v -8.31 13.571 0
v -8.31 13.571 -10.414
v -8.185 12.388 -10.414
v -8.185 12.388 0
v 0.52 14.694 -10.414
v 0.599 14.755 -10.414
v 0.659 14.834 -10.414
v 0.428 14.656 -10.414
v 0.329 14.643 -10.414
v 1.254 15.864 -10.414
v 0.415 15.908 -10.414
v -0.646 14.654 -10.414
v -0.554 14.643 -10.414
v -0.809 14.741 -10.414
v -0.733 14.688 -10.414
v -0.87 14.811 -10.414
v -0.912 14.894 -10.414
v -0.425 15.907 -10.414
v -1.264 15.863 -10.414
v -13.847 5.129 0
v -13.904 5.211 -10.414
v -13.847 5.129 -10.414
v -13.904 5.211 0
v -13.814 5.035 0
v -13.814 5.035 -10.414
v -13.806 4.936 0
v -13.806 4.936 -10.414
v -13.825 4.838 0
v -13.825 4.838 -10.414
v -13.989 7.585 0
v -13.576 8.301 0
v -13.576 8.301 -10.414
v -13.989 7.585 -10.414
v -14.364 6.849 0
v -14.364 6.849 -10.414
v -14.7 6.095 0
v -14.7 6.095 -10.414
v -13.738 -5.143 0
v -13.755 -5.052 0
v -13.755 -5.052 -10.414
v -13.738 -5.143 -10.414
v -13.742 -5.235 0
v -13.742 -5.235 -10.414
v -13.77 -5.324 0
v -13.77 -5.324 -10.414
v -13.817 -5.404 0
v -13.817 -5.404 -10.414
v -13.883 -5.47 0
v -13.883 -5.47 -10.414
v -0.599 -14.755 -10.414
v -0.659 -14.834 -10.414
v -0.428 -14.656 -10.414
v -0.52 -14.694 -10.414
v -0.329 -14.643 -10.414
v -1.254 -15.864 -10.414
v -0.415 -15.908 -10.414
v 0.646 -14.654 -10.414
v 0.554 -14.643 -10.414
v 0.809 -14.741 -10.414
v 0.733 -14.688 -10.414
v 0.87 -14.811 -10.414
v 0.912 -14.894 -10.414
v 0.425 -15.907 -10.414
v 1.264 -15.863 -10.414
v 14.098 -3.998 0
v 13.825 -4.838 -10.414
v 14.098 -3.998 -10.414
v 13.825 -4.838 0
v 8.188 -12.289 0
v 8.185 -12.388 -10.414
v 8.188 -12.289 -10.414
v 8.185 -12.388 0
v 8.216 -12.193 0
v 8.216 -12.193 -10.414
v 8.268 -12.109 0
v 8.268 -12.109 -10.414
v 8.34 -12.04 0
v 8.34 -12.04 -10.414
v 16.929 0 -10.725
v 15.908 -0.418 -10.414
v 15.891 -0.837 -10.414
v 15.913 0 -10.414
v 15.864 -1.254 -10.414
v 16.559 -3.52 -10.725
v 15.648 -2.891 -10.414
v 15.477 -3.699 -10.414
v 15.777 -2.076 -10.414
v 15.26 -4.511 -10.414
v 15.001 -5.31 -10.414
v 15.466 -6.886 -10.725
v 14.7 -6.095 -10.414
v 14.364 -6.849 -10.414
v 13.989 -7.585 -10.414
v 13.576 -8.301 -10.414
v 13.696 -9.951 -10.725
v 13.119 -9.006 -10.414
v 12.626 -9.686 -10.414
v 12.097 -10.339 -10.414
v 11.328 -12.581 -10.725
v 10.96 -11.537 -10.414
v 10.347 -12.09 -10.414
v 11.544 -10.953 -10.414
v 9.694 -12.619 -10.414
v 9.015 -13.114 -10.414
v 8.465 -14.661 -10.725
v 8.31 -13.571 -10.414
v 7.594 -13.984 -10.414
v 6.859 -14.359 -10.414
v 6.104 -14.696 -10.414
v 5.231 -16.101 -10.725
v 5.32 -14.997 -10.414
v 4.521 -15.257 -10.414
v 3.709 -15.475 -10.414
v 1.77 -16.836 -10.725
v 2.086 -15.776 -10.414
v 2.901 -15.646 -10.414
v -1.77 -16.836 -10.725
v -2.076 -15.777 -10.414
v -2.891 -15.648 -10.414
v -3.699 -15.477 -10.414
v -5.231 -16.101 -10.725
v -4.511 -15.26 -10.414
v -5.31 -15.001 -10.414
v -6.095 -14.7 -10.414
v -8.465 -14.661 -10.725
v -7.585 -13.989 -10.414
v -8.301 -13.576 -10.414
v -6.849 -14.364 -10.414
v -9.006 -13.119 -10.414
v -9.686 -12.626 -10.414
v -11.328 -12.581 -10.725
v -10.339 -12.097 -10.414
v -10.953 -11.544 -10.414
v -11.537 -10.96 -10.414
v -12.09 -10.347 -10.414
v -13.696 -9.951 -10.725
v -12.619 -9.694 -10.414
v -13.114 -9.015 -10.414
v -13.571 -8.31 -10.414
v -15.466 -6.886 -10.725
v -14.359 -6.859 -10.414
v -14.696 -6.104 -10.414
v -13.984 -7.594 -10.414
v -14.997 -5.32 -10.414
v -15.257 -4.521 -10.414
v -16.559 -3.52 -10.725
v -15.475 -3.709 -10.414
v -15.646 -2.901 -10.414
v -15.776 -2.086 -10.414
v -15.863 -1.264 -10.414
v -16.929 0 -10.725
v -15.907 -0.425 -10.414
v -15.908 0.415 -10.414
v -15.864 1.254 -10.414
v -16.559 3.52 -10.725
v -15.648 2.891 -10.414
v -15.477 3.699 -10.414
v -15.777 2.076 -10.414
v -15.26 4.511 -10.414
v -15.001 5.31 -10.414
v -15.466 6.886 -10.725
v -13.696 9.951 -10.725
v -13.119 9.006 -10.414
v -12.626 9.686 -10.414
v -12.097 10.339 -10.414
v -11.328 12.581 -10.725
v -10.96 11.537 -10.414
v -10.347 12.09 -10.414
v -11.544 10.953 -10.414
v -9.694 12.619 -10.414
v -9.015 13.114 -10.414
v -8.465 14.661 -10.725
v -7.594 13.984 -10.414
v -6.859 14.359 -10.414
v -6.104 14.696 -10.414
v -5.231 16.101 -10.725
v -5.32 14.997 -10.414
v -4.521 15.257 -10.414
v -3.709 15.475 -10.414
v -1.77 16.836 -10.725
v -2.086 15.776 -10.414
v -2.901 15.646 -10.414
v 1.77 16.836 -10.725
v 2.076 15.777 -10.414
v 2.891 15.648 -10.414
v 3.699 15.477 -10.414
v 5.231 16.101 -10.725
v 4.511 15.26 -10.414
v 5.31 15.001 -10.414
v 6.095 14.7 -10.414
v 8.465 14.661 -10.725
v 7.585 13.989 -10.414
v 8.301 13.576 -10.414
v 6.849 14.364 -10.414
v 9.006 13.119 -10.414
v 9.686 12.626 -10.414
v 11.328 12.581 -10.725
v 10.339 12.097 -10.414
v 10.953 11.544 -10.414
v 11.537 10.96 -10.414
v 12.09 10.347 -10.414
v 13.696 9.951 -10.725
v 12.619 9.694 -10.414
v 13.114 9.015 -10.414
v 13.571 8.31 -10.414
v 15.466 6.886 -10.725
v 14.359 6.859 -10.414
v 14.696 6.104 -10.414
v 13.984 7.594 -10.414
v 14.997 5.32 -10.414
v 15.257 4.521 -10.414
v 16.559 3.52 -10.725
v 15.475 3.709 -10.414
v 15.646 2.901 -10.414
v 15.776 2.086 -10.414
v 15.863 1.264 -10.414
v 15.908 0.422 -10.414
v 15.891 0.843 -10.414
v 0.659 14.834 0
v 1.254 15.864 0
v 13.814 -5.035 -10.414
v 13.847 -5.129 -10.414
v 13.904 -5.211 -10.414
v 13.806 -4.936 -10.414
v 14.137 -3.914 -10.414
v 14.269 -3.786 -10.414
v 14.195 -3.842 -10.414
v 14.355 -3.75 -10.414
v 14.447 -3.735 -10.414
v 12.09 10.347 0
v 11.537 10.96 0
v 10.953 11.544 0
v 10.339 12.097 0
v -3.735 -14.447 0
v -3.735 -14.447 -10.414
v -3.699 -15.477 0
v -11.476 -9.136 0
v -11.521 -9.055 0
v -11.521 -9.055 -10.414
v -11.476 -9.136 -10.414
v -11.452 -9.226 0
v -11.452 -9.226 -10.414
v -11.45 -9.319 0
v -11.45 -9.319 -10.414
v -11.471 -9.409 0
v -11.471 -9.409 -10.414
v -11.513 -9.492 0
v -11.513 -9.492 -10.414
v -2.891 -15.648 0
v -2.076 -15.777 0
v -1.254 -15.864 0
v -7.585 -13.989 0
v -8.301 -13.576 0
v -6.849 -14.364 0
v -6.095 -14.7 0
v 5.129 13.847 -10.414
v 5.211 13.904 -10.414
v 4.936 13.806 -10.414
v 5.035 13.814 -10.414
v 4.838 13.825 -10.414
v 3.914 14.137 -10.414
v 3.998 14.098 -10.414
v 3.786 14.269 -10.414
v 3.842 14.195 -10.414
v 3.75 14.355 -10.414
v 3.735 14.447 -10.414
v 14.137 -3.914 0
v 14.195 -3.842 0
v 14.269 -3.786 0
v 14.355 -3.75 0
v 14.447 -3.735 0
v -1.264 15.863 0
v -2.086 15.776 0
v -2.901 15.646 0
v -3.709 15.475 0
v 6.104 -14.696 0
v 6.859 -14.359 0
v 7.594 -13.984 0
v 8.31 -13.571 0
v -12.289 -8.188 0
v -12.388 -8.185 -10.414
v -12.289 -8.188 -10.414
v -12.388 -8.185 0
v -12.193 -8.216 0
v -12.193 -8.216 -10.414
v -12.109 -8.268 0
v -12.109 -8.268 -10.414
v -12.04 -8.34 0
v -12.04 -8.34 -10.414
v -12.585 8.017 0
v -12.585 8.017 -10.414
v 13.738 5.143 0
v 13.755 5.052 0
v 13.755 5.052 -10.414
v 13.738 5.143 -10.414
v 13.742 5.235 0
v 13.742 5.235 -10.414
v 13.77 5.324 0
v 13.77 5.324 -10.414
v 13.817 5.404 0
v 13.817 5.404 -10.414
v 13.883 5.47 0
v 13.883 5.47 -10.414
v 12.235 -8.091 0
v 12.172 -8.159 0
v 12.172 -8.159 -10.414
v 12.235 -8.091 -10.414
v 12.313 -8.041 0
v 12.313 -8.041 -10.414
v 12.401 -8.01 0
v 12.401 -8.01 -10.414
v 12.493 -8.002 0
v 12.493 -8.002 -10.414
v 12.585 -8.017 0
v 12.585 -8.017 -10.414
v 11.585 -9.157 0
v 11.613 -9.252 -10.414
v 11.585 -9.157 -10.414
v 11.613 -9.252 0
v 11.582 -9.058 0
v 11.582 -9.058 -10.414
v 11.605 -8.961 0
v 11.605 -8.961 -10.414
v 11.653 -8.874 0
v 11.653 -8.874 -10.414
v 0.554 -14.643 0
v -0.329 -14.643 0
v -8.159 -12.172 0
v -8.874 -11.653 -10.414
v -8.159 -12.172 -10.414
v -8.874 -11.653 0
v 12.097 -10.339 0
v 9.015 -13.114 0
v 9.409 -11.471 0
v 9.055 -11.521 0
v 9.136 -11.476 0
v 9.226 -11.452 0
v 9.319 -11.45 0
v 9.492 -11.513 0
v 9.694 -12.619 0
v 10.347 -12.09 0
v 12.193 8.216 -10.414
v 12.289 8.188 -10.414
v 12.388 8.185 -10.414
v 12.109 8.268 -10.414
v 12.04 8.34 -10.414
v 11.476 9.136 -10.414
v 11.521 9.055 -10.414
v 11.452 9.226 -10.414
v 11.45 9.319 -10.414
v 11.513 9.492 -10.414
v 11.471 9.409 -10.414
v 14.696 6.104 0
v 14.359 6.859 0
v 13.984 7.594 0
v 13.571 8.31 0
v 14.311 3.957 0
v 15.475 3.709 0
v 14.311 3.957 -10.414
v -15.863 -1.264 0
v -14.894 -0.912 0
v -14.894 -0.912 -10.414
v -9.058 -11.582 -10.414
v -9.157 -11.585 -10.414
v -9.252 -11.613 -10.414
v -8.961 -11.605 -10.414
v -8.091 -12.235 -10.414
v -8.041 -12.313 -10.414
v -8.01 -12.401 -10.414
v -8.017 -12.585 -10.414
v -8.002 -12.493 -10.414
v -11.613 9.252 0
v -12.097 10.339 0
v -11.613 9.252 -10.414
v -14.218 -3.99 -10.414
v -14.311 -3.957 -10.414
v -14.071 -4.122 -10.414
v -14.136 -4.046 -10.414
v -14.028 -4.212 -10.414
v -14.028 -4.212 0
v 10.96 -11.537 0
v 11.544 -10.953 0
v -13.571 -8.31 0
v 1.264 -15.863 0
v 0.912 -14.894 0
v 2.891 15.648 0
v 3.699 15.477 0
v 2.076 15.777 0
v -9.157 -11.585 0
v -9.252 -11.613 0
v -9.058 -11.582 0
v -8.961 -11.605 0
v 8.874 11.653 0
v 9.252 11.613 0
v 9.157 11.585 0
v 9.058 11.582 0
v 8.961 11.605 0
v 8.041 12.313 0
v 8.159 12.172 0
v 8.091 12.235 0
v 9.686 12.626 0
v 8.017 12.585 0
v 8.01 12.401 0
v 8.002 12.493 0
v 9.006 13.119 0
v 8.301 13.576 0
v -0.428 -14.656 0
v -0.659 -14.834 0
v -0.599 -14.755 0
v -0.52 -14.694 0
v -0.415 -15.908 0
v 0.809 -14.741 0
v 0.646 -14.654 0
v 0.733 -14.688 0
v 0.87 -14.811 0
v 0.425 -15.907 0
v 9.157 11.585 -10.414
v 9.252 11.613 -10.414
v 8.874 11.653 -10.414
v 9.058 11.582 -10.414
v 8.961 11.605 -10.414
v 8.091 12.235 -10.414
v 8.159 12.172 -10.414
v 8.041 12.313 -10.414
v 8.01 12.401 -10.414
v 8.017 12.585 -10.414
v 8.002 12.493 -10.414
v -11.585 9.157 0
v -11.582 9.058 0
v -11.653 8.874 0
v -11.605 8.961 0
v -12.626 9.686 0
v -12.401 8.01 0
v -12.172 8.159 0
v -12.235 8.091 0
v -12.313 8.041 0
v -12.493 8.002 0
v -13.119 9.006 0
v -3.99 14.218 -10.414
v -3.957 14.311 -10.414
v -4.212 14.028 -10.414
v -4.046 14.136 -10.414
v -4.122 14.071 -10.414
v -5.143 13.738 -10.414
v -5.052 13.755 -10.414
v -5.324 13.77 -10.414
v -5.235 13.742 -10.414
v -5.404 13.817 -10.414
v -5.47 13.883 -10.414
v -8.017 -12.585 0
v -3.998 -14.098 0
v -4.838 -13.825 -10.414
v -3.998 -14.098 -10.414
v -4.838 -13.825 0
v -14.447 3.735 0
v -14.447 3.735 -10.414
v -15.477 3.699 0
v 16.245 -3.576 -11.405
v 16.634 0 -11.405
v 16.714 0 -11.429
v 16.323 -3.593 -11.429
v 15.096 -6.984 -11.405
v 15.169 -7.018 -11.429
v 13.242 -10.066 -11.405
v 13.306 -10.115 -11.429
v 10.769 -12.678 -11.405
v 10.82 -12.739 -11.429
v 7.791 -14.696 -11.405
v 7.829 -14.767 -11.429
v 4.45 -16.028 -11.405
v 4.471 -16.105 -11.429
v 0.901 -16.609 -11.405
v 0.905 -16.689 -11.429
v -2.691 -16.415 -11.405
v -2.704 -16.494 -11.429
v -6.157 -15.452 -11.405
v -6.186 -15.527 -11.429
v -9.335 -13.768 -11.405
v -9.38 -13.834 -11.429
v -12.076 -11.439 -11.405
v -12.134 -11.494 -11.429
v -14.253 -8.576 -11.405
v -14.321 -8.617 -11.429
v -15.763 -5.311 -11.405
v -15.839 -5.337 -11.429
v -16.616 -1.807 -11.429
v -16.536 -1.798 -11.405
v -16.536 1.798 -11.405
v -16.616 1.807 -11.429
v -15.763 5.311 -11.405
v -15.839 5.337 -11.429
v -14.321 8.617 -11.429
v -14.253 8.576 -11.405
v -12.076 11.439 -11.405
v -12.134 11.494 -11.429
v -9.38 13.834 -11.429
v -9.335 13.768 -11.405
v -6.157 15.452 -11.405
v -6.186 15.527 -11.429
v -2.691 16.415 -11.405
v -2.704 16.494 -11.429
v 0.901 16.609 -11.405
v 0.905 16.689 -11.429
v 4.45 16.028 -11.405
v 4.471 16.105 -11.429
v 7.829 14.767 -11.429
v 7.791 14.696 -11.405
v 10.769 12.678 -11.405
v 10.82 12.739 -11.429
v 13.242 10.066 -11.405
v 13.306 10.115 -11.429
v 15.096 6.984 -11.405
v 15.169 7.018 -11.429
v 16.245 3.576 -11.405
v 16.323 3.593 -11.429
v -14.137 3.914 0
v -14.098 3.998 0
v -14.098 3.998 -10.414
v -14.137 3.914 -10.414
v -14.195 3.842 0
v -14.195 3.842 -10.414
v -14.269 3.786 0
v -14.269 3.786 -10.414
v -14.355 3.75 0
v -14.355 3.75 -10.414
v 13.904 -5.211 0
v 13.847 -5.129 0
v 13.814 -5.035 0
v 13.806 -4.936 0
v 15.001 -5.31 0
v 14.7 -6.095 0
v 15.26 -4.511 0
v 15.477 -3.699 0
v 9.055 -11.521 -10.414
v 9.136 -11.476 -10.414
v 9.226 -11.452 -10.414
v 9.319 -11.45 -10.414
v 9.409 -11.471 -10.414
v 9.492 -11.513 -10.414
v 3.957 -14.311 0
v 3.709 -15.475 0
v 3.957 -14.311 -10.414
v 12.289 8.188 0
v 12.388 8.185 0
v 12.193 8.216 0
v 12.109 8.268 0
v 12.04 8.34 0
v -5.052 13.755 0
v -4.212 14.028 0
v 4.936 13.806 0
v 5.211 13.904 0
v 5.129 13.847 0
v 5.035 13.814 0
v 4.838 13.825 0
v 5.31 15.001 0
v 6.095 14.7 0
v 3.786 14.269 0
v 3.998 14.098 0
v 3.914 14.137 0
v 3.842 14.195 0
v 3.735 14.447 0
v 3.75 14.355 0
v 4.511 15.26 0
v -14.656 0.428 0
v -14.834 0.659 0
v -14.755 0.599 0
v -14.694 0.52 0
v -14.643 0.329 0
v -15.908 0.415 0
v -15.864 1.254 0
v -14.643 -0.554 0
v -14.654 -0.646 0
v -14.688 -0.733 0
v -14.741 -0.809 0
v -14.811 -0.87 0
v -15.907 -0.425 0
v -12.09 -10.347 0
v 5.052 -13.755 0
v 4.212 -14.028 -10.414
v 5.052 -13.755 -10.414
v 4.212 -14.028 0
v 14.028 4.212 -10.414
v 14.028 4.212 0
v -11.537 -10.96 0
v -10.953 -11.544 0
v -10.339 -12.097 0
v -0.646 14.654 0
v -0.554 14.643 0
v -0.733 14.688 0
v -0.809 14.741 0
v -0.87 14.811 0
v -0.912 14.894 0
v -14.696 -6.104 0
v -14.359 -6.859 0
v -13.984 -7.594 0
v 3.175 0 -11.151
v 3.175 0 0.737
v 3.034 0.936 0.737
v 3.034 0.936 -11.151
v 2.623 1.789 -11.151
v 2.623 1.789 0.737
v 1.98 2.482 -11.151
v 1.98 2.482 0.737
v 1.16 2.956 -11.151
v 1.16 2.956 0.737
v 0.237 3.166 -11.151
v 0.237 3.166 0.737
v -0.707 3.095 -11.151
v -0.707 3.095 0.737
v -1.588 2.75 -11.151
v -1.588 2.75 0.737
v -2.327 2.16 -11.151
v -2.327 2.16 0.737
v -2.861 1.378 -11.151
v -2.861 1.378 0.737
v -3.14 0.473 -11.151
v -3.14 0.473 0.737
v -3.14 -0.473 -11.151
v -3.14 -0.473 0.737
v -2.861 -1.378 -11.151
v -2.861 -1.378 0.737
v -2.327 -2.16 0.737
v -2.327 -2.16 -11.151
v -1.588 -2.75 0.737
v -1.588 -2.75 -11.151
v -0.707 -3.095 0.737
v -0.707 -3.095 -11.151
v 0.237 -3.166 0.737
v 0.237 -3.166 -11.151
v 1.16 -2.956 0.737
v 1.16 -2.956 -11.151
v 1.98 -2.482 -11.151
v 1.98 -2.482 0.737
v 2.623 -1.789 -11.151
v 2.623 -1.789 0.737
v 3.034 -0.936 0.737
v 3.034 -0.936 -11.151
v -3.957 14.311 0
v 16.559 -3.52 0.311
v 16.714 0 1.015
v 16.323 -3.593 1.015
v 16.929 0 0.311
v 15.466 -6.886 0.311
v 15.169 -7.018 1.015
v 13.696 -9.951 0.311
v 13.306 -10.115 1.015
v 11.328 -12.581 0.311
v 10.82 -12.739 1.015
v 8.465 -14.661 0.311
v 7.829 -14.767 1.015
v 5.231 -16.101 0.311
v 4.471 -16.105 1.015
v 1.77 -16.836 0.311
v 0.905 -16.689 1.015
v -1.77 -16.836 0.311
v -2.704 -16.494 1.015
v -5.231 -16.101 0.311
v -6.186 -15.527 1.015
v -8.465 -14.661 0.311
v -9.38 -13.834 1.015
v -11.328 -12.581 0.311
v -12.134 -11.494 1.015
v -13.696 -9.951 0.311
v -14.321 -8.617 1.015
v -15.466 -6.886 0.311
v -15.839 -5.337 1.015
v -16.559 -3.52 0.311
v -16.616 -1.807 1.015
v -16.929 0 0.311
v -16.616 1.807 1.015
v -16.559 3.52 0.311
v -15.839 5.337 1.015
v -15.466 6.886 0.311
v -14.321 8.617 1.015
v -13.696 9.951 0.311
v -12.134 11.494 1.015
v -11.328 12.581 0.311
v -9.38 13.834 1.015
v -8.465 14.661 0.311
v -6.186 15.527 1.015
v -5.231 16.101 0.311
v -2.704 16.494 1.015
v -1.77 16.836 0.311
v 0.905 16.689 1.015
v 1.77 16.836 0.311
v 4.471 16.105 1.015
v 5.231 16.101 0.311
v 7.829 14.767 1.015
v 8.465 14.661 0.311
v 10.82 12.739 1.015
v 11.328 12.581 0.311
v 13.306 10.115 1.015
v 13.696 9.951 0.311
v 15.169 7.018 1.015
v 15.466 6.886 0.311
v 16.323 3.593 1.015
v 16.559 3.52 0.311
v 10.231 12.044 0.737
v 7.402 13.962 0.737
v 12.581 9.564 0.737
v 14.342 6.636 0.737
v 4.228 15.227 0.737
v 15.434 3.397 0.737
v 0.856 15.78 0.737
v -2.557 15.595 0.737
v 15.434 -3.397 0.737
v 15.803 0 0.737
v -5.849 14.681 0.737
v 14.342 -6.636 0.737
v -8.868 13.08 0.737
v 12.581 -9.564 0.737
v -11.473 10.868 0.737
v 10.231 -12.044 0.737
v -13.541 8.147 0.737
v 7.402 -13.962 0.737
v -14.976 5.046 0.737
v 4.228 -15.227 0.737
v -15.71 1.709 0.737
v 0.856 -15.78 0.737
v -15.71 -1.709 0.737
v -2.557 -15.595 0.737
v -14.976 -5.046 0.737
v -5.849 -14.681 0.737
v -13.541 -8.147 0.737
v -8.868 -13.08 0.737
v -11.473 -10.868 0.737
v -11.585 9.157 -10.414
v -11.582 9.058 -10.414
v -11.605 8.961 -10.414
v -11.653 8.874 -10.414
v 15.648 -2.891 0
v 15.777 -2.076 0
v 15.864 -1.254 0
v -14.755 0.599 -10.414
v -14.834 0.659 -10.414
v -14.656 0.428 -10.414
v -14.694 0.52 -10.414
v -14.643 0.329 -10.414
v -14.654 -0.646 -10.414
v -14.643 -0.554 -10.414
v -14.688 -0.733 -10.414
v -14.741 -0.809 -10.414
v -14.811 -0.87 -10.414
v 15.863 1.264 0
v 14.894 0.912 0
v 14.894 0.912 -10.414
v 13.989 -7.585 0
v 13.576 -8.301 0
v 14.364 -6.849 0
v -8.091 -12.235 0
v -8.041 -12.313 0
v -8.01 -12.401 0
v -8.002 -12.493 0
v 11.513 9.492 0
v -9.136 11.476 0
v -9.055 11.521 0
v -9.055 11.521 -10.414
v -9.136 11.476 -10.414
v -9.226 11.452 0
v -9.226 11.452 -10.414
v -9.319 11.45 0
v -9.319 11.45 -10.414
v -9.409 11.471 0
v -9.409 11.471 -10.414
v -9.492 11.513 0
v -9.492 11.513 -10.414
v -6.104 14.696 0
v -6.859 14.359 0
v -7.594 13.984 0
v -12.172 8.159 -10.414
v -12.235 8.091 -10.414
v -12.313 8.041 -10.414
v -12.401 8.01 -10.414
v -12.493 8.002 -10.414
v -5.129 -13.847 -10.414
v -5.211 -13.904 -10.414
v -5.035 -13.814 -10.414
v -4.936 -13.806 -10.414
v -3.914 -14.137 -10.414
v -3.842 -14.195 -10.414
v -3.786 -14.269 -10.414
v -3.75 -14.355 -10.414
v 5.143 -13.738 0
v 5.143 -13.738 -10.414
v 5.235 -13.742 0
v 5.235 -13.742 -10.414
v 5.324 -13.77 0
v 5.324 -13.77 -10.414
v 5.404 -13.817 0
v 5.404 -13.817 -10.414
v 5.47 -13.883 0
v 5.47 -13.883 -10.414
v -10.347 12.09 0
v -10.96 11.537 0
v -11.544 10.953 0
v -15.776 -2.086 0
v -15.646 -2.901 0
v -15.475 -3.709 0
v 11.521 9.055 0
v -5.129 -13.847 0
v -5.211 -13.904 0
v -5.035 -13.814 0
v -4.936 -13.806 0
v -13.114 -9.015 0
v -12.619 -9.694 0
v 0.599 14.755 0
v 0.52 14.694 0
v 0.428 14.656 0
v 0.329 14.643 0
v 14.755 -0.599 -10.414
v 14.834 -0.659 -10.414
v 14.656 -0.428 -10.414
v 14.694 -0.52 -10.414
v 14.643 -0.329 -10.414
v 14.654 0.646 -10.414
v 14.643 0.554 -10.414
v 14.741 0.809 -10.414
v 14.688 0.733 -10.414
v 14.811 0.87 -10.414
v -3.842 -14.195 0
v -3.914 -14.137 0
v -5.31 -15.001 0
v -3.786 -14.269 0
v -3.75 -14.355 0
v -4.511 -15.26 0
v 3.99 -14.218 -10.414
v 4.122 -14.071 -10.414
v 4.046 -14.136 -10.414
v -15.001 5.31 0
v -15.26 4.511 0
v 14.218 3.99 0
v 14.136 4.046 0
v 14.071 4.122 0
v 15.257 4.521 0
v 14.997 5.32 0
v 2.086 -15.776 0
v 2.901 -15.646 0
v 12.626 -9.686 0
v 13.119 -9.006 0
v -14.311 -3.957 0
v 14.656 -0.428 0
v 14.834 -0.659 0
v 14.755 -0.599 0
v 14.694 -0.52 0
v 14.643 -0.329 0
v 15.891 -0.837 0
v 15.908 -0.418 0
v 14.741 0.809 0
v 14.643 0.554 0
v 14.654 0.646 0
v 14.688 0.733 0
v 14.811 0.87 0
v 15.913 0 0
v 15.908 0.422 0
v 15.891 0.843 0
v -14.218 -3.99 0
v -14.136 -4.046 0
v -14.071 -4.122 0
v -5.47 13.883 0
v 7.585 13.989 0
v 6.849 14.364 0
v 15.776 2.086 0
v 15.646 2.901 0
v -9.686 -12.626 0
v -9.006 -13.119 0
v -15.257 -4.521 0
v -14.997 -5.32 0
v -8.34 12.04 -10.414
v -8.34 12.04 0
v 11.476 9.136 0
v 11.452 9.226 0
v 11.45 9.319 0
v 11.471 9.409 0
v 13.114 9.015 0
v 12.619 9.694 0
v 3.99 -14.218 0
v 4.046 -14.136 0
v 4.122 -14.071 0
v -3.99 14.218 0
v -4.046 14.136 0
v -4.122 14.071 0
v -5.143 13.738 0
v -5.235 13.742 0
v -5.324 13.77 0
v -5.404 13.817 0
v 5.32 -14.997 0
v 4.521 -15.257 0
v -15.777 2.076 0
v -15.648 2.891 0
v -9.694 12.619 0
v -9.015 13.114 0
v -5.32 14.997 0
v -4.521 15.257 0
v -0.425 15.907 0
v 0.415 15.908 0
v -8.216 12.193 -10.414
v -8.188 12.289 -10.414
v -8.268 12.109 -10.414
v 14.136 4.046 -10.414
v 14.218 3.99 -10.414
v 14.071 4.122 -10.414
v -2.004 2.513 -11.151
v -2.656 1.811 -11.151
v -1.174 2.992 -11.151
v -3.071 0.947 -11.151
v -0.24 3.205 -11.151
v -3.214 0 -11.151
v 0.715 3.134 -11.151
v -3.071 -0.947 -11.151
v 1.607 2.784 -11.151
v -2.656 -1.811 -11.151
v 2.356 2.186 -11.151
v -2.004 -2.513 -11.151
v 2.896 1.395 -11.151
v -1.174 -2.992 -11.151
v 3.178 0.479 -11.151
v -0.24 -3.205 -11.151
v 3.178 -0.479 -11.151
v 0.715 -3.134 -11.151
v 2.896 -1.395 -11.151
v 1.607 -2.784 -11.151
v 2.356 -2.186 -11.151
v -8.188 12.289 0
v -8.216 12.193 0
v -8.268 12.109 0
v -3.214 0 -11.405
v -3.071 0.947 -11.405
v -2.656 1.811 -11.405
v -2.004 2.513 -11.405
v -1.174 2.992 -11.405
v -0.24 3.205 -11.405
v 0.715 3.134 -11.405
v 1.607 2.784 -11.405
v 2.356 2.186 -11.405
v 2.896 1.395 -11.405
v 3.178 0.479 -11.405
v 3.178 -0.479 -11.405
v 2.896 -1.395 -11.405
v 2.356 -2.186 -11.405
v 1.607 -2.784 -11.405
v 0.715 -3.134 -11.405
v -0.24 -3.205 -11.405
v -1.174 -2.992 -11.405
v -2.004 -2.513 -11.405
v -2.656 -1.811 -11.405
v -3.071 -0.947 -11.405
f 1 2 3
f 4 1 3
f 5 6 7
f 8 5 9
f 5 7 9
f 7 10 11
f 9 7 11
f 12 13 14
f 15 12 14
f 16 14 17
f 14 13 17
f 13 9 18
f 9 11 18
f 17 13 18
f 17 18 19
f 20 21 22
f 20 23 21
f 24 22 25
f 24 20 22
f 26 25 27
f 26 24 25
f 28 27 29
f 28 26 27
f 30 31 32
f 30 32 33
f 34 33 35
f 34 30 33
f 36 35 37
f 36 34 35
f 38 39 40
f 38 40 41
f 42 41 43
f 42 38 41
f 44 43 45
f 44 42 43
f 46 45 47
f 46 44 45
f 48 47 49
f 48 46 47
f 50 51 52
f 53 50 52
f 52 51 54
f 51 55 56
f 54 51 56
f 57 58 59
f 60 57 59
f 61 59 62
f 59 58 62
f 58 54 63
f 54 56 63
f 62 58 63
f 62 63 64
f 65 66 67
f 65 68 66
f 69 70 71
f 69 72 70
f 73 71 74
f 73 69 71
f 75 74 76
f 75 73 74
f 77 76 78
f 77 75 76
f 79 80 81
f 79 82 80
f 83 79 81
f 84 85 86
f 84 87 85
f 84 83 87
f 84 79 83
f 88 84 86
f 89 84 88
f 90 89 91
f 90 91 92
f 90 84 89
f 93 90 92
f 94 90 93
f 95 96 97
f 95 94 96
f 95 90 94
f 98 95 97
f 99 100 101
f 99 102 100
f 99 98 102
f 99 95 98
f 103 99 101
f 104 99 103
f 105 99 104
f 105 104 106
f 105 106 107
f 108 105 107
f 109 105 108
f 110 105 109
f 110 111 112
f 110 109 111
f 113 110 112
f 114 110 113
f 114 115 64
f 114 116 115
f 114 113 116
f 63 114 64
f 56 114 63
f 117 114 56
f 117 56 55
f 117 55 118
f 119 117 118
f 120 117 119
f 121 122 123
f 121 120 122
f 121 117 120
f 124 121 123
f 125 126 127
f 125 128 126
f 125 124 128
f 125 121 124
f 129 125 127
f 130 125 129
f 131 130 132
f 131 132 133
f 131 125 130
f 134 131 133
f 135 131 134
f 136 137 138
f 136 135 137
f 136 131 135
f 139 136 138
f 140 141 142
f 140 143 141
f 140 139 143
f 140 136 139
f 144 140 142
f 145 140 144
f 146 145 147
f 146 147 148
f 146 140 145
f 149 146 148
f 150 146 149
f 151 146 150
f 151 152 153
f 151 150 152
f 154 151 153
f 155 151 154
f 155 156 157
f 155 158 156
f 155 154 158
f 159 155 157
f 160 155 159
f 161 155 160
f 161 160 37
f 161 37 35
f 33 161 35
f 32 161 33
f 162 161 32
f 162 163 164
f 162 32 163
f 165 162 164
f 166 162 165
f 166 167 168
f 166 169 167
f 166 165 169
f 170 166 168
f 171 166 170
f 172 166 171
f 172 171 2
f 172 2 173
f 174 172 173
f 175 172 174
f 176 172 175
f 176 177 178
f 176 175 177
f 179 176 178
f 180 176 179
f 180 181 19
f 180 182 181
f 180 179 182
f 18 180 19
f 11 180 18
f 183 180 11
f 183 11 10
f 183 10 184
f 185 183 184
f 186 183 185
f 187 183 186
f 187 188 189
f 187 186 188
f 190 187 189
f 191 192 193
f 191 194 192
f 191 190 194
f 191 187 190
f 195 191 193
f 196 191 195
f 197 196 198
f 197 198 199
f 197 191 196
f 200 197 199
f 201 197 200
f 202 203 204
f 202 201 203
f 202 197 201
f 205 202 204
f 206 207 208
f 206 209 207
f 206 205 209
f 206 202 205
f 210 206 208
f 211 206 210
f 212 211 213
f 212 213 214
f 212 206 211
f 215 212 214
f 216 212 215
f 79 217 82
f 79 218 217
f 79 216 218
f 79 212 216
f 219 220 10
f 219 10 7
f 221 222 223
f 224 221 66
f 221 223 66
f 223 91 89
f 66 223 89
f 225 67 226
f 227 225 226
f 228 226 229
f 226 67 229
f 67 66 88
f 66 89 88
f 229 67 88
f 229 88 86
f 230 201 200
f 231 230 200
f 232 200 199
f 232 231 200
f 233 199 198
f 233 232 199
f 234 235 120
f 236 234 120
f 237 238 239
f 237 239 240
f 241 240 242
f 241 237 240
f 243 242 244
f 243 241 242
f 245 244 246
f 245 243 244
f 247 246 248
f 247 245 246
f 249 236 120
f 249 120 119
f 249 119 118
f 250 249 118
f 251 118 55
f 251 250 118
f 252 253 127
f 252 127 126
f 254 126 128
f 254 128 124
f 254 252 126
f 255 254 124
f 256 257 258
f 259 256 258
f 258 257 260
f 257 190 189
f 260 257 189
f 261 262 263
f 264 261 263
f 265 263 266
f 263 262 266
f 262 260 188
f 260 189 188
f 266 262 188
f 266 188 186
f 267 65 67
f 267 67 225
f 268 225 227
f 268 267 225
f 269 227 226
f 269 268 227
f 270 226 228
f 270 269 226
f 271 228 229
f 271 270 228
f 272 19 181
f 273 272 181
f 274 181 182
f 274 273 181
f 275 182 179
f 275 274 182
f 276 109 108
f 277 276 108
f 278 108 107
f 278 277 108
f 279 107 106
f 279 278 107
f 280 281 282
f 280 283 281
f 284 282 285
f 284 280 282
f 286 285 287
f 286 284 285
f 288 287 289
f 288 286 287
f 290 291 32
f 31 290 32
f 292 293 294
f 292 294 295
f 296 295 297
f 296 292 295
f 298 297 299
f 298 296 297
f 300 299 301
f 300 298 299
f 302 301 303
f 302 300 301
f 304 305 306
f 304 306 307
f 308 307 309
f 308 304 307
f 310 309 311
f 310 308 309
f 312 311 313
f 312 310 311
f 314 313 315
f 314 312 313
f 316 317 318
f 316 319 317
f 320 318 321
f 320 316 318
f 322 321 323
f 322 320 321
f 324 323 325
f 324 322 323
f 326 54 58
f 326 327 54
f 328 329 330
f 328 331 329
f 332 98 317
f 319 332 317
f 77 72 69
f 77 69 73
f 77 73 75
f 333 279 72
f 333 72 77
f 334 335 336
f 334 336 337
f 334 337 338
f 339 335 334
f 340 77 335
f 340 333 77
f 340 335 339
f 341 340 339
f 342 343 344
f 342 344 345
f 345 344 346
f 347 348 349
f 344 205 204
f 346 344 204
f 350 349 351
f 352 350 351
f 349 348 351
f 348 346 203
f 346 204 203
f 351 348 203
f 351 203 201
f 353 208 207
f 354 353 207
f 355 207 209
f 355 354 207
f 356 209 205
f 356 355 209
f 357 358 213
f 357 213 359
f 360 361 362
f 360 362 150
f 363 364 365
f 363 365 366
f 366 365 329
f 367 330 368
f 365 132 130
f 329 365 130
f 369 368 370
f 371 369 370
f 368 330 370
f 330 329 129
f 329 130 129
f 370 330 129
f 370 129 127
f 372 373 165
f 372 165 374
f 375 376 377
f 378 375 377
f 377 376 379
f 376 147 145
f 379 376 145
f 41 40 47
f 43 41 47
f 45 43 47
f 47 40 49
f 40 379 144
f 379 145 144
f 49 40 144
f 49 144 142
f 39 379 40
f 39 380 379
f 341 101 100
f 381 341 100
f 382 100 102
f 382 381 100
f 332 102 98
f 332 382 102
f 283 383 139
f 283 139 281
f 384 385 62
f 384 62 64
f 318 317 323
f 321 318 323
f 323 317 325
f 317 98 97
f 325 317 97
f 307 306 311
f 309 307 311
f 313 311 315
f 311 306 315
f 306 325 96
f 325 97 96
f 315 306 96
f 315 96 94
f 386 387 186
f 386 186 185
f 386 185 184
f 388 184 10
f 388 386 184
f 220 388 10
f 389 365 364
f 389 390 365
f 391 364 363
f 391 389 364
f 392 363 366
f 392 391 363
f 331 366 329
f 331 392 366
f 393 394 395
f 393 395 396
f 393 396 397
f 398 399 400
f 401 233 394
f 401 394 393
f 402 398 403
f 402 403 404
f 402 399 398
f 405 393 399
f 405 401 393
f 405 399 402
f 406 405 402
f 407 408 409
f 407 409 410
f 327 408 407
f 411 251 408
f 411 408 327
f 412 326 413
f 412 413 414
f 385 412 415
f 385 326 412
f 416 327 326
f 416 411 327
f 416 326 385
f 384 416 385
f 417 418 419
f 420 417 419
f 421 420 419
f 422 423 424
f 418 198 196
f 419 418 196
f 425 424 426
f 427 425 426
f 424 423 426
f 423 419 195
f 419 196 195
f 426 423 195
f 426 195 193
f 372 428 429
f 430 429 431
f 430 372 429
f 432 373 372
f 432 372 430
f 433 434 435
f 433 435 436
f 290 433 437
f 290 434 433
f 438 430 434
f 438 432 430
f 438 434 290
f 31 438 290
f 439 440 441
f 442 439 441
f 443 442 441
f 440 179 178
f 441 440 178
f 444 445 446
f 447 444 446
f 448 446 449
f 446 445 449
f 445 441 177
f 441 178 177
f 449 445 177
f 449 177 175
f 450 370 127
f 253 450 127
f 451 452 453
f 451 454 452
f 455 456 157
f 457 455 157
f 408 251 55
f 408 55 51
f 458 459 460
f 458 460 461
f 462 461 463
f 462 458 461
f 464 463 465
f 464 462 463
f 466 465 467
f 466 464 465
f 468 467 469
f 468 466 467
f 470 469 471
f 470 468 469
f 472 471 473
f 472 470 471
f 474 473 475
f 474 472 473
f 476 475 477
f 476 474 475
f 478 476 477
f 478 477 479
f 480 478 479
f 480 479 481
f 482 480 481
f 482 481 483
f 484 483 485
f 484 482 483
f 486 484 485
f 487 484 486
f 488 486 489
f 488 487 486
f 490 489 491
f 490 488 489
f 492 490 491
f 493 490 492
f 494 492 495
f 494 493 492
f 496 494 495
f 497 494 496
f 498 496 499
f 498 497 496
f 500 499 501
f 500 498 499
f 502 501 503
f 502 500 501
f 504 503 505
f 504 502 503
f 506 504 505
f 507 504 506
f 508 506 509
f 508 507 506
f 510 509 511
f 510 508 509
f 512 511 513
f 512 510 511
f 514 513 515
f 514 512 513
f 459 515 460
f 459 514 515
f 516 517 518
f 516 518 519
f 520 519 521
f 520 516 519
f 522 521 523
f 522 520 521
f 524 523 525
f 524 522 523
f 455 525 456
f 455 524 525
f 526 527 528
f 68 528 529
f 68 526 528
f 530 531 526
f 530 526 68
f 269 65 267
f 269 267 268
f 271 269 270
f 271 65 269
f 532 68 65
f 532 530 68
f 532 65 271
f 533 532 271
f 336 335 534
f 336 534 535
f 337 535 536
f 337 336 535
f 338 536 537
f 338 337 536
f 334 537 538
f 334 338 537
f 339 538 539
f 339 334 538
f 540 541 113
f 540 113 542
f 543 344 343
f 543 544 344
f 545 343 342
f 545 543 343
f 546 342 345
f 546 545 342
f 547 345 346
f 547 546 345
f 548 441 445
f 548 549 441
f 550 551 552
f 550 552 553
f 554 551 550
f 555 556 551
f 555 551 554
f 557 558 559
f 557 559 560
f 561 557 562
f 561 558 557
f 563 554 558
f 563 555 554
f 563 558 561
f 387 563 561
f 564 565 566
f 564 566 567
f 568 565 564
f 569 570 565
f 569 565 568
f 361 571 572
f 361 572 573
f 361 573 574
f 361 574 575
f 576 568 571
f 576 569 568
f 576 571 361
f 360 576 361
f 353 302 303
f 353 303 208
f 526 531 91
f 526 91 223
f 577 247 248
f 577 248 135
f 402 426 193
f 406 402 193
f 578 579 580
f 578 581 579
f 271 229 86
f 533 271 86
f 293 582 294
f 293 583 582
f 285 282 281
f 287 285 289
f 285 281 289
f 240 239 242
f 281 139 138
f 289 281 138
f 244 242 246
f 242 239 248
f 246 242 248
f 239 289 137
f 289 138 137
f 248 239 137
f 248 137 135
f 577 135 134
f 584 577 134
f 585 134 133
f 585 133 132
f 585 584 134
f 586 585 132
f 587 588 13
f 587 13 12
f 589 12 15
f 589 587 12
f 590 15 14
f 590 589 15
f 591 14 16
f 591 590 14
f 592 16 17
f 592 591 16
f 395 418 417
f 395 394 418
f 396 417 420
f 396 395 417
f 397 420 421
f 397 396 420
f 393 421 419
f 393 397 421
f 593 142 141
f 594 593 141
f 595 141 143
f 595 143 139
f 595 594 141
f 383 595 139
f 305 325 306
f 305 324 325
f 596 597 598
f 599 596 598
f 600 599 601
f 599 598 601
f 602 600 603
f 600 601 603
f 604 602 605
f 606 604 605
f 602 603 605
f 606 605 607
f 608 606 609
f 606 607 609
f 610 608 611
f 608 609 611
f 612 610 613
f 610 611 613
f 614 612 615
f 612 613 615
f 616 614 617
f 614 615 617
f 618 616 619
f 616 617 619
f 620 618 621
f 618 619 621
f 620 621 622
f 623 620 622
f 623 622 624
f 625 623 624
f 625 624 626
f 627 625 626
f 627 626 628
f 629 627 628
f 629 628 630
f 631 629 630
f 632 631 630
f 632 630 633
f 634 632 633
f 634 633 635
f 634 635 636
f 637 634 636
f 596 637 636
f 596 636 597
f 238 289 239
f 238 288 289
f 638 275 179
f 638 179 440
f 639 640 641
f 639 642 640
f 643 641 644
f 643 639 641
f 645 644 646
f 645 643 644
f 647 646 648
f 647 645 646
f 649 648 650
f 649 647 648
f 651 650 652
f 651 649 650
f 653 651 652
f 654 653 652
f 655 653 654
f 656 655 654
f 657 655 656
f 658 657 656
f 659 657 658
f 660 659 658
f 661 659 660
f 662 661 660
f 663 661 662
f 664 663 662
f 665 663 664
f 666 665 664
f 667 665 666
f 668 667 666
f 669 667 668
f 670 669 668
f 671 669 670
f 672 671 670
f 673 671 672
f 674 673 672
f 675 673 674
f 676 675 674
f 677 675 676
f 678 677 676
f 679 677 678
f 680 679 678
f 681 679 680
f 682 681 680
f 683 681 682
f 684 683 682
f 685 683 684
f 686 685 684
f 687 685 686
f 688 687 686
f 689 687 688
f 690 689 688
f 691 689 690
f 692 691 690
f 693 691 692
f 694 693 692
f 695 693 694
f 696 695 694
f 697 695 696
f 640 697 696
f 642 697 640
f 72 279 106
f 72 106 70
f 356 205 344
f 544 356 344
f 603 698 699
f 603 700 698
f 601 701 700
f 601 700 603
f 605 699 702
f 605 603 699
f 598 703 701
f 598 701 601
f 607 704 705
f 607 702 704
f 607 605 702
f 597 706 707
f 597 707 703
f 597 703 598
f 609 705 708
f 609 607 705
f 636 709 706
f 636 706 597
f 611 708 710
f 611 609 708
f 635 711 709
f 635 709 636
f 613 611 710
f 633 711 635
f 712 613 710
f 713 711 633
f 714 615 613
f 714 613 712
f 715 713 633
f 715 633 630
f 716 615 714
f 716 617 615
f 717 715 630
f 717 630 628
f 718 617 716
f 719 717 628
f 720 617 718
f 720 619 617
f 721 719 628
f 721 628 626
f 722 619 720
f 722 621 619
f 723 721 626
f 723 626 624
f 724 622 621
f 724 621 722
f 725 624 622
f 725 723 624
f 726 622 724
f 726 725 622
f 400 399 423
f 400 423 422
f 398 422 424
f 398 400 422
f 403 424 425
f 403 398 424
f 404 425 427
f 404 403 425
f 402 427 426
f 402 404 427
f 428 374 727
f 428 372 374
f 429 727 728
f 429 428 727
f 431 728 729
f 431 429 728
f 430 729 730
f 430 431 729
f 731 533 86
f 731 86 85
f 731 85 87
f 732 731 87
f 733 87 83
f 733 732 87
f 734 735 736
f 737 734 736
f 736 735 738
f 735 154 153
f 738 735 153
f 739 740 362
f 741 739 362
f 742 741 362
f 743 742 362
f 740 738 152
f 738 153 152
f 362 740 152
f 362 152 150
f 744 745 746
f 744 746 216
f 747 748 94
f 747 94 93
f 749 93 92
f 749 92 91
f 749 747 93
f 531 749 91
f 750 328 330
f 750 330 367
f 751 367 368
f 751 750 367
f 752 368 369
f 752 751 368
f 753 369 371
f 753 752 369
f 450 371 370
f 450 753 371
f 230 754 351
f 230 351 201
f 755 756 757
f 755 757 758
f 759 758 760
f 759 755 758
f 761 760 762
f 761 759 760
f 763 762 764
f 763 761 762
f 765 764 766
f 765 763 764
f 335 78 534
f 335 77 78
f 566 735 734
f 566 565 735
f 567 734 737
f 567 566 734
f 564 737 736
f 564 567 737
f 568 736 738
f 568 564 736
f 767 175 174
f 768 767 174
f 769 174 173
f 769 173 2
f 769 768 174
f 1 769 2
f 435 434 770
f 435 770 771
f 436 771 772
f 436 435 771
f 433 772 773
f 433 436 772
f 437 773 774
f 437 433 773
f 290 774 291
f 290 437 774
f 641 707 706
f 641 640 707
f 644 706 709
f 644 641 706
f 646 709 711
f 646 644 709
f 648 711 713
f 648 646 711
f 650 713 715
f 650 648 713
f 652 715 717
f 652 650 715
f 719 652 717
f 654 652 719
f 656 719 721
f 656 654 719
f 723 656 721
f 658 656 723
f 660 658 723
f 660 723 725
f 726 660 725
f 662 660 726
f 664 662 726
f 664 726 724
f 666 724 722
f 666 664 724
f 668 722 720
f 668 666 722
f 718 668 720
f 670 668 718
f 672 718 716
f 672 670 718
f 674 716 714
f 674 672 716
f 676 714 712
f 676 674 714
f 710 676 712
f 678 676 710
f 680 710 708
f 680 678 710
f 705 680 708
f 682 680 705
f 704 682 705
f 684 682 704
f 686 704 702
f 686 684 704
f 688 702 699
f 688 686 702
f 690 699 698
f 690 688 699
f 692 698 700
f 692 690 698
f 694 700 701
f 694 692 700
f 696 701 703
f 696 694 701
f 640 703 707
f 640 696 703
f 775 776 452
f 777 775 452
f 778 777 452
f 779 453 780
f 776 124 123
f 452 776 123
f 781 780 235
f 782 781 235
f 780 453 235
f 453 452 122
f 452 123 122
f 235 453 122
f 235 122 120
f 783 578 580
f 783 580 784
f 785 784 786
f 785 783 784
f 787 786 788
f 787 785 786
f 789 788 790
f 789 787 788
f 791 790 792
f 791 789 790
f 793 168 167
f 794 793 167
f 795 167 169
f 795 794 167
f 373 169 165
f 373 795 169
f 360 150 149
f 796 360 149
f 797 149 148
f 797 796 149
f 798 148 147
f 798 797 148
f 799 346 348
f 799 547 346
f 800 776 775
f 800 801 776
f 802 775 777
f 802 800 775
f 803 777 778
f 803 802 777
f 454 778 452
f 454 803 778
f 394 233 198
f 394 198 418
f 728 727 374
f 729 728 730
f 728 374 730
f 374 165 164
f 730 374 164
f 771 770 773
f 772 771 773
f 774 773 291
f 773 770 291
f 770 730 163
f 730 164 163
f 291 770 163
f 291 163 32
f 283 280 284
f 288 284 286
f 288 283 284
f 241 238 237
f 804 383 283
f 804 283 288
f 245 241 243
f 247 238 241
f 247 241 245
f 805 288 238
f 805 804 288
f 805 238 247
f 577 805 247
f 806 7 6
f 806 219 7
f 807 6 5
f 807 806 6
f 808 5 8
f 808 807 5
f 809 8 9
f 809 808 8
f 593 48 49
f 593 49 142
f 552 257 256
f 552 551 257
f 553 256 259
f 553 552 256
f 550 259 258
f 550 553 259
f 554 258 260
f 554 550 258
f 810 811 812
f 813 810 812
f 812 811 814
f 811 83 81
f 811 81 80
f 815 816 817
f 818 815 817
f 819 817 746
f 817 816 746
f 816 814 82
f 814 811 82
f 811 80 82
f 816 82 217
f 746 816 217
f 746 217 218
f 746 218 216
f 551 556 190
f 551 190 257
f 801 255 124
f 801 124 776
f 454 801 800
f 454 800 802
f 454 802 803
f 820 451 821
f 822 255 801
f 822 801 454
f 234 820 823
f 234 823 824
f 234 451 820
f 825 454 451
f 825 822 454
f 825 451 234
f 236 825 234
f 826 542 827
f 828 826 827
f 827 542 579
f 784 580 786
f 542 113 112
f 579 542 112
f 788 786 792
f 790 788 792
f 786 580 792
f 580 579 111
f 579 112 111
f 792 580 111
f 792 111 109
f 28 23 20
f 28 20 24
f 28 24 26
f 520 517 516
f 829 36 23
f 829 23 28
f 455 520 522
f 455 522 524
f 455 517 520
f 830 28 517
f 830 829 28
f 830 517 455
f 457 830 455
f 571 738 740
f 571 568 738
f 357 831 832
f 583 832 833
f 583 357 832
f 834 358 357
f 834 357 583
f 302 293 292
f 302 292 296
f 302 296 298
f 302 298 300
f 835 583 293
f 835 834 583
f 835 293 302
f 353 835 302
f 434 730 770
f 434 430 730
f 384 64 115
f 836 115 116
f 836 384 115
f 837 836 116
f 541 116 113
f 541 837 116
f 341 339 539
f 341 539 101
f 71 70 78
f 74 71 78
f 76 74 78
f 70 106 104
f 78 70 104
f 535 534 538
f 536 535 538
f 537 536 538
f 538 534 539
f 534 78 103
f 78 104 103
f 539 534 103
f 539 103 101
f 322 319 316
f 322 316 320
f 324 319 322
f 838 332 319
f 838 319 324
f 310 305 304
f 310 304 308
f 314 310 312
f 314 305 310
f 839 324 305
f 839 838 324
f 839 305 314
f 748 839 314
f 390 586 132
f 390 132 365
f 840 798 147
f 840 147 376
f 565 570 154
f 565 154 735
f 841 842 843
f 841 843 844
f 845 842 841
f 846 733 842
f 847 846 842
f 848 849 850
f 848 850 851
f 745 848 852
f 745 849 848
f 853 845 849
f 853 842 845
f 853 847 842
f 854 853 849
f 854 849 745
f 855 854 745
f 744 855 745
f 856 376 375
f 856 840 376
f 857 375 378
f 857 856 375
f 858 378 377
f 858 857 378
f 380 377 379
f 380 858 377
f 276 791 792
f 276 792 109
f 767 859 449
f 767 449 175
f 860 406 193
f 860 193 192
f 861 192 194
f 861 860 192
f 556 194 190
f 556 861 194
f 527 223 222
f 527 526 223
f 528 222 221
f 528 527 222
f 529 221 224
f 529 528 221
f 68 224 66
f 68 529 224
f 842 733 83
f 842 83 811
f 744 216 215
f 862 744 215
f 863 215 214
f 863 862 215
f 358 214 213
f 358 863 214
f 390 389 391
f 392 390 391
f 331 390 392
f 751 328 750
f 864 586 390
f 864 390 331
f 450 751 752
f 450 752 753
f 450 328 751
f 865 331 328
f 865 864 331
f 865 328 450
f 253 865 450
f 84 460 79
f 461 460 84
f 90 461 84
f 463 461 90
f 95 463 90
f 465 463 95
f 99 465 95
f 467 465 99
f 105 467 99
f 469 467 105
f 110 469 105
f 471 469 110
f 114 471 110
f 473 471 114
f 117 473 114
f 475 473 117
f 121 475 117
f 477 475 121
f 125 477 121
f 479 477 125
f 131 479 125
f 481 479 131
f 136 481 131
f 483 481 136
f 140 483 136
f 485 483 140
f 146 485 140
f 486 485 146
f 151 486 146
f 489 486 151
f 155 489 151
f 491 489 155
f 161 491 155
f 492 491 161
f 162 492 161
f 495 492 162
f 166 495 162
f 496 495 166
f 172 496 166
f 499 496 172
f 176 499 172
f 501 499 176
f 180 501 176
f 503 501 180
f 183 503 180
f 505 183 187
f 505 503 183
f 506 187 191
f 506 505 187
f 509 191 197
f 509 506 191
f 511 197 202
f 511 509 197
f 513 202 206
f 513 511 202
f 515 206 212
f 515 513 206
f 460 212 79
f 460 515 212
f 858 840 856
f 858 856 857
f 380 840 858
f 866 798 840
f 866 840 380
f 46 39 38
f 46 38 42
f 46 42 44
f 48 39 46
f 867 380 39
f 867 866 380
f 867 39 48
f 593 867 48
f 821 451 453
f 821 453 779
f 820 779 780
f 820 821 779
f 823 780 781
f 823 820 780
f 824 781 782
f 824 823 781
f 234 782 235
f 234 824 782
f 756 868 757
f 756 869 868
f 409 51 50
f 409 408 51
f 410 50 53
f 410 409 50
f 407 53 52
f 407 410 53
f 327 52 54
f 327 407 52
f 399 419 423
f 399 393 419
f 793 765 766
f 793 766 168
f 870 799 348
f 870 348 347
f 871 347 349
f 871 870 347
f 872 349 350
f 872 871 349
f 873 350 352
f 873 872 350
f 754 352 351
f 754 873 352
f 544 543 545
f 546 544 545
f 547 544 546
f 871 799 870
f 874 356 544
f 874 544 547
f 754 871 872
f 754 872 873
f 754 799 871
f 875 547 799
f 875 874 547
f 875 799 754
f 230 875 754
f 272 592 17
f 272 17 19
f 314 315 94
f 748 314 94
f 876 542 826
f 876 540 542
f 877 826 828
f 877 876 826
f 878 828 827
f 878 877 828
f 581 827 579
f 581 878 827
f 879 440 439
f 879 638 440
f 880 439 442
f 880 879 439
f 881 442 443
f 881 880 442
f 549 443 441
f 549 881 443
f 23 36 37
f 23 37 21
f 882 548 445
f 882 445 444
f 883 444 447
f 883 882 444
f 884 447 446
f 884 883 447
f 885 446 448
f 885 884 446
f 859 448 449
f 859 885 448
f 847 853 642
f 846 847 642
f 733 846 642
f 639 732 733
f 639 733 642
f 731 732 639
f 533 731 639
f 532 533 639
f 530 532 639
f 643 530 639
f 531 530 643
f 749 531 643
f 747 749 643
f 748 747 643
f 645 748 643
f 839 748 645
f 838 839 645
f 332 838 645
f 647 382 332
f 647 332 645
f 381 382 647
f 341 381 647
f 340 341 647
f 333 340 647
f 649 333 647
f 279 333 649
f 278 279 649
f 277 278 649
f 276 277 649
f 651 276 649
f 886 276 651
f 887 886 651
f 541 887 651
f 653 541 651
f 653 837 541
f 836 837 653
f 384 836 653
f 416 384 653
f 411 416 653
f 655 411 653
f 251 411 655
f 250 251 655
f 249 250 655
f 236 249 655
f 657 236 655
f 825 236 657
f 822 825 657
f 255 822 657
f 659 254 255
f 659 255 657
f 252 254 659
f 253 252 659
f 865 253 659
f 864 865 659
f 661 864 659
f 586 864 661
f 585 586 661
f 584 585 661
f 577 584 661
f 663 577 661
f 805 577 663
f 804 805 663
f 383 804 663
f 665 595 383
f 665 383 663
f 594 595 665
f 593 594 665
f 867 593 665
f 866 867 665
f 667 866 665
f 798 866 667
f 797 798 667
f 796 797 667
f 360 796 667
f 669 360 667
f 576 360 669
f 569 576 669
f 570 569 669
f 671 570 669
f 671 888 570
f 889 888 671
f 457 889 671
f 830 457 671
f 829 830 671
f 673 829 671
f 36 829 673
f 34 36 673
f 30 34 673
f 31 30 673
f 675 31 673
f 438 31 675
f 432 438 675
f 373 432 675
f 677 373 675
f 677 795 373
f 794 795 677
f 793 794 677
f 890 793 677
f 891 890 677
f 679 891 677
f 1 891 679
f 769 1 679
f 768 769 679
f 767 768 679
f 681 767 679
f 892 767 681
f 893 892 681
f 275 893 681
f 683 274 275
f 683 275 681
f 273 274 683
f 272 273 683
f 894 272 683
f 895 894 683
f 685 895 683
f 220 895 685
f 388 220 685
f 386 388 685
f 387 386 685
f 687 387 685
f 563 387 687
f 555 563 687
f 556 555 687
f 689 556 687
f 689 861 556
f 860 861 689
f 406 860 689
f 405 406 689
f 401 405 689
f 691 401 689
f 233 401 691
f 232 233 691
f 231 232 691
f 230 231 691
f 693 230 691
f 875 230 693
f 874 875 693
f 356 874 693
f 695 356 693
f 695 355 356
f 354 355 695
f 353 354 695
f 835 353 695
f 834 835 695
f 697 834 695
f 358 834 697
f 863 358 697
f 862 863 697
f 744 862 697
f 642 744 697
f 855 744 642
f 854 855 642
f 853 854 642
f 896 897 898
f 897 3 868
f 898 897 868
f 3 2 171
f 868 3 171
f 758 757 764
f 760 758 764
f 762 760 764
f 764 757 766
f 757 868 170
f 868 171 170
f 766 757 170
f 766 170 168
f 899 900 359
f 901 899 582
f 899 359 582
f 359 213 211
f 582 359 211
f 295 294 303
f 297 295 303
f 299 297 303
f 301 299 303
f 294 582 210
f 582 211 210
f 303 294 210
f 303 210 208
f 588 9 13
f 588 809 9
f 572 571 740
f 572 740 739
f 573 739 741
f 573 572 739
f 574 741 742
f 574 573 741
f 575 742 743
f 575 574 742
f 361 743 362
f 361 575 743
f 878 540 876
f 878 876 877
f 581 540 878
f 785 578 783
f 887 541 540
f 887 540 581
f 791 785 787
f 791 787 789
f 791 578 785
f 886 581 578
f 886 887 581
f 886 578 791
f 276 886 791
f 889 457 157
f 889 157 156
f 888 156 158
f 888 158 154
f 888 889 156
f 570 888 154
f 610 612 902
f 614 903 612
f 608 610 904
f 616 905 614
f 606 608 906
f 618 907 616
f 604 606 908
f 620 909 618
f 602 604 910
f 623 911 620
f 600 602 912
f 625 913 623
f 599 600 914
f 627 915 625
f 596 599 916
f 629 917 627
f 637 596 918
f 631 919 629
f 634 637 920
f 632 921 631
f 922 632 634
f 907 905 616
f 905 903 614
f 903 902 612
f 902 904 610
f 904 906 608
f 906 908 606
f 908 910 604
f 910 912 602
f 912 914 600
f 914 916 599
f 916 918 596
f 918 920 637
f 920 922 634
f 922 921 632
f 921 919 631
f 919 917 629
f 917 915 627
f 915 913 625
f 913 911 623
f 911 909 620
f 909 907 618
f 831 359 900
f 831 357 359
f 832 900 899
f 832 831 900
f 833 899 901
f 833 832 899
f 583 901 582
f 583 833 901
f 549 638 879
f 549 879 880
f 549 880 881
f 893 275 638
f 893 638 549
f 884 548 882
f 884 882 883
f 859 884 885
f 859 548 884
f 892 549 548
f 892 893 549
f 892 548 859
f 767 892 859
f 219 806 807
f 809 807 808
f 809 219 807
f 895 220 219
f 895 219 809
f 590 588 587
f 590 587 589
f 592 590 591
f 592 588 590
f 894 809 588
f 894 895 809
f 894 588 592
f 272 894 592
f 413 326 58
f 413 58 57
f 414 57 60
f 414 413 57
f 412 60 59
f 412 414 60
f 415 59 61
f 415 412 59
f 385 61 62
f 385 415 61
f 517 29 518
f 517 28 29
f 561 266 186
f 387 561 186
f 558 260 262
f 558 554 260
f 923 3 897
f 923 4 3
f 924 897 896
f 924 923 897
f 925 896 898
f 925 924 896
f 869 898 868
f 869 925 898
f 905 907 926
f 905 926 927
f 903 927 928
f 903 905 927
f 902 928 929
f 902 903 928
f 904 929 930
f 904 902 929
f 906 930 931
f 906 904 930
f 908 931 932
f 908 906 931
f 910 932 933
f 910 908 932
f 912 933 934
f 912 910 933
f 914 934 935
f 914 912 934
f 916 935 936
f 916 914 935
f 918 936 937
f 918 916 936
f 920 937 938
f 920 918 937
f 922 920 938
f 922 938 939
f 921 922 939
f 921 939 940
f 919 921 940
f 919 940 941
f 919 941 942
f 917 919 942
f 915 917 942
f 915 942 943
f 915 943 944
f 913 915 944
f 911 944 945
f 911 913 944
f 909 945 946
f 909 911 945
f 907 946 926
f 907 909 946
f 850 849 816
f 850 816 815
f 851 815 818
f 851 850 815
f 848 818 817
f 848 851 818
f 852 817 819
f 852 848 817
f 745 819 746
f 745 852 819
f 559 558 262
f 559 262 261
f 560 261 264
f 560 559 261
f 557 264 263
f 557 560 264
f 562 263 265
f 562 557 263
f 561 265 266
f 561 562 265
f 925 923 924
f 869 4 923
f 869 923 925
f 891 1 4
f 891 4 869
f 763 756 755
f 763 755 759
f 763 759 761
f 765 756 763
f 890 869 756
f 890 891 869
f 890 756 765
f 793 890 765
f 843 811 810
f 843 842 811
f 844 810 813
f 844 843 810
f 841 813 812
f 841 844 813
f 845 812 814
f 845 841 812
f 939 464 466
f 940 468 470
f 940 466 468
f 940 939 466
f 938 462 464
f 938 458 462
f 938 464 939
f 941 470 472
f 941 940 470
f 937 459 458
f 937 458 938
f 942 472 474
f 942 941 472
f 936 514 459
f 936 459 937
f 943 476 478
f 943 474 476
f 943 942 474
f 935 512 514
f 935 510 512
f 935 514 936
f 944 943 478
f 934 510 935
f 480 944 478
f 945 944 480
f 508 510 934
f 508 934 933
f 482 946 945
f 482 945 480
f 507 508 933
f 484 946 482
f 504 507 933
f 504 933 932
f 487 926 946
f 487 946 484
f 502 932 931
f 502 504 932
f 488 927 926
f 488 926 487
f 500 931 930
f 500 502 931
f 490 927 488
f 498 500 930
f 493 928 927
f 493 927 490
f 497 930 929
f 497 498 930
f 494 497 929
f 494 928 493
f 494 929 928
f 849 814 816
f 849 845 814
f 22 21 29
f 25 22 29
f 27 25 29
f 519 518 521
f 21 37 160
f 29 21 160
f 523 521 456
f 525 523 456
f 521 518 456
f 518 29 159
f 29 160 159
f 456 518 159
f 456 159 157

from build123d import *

# Parameters (mm, degrees)
SKETCH1_R           = 15.9131
BASEPULLEY_DEPTH    = 10.414
GROOVE_DEPTH        = 5.207
GROOVES_COUNT       = 20
GROOVES_ANGLE       = 342
SKETCH4_W           = 0.254
SKETCH4_H           = 11.43
BORSKE_R            = 3.175
BORE_DEPTH          = 27.855010035
SKETCH7_R           = 16.713739002
SKETCH7_R_2         = 3.214245881
BOSS_EXTRUDE1_DEPTH = 0.254


with BuildPart() as part:
    # Sketch1 → BasePulley (new body)
    with BuildSketch(Plane.XY):
        Circle(SKETCH1_R)
    extrude(amount=-BASEPULLEY_DEPTH)

    # Sketch2 → Flange (revolve)
    with BuildSketch(Plane(origin=(0, 0, 0), x_dir=(0, 0, -1), z_dir=(1, 0, 0)), mode=Mode.PRIVATE) as flange_sk:
        Polygon((10.414, 15.9131), (10.724622372, 16.9291), (11.429036456, 16.713739002), (11.1506, 15.803014392), (11.1506, 0), (-0.7366, 0), (-0.7366, 15.803014392), (-1.015036456, 16.713739002), (-0.310622372, 16.9291), (0, 15.9131), align=None)
    revolve(flange_sk.sketch.rotate(Axis((0, 0, 0), (0, 0, -1)), 90), axis=Axis((0, 0, 0), (0, 0, -1)))

    # Sketch3 → Groove (cut, symmetric)
    with BuildSketch(Plane.XY.offset(-5.207)):
        with BuildLine():
            Line((-1.2827, 15.9131), (-1.2827, 41.3131))
            Line((-1.2827, 41.3131), (1.2827, 41.3131))
            Line((1.2827, 41.3131), (1.2827, 15.9131))
            Line((1.2827, 15.9131), (0.659450384, 14.8336))
            ThreePointArc((0.659450384, 14.8336), (0.519994706, 14.694144321), (0.329494706, 14.6431))
            Line((0.329494706, 14.6431), (-0.55367873, 14.6431))
            ThreePointArc((-0.55367873, 14.6431), (-0.772211353, 14.712003071), (-0.911701619, 14.893790325))
            Line((-0.911701619, 14.893790325), (-1.2827, 15.9131))
        make_face()
    groove = extrude(amount=GROOVE_DEPTH, both=True, mode=Mode.SUBTRACT)

    # Grooves: Groove ×20 about axis
    grooves_axis = Axis((0, 0, -10.414), (0, 0, 1))
    for i in range(1, GROOVES_COUNT):
        add(groove.rotate(grooves_axis, i * GROOVES_ANGLE / (GROOVES_COUNT - 1)), mode=Mode.SUBTRACT)

    # Sketch4 → BaseHub (revolve)
    with BuildSketch(Plane(origin=(0, 0, 0), x_dir=(0, 0, -1), z_dir=(1, 0, 0)), mode=Mode.PRIVATE) as basehub_sk:
        with Locations((-0.127, 5.715)):
            Rectangle(SKETCH4_W, SKETCH4_H)
    revolve(basehub_sk.sketch.rotate(Axis((0, 0, 0), (0, 0, -1)), 274.520210968), axis=Axis((0, 0, 0), (0, 0, -1)))

    # BorSke → Bore (cut, through all)
    with BuildSketch(Plane.XY.offset(0.7366)):
        Circle(BORSKE_R)
    extrude(amount=-BORE_DEPTH, mode=Mode.SUBTRACT)

    # Sketch7 → Boss-Extrude1 (add)
    with BuildSketch(Plane(origin=(0, 0, -11.1506), x_dir=(-1, 0, 0), z_dir=(0, 0, -1))):
        Circle(SKETCH7_R)
        Circle(SKETCH7_R_2, mode=Mode.SUBTRACT)
    extrude(amount=BOSS_EXTRUDE1_DEPTH)


solid = part.part
